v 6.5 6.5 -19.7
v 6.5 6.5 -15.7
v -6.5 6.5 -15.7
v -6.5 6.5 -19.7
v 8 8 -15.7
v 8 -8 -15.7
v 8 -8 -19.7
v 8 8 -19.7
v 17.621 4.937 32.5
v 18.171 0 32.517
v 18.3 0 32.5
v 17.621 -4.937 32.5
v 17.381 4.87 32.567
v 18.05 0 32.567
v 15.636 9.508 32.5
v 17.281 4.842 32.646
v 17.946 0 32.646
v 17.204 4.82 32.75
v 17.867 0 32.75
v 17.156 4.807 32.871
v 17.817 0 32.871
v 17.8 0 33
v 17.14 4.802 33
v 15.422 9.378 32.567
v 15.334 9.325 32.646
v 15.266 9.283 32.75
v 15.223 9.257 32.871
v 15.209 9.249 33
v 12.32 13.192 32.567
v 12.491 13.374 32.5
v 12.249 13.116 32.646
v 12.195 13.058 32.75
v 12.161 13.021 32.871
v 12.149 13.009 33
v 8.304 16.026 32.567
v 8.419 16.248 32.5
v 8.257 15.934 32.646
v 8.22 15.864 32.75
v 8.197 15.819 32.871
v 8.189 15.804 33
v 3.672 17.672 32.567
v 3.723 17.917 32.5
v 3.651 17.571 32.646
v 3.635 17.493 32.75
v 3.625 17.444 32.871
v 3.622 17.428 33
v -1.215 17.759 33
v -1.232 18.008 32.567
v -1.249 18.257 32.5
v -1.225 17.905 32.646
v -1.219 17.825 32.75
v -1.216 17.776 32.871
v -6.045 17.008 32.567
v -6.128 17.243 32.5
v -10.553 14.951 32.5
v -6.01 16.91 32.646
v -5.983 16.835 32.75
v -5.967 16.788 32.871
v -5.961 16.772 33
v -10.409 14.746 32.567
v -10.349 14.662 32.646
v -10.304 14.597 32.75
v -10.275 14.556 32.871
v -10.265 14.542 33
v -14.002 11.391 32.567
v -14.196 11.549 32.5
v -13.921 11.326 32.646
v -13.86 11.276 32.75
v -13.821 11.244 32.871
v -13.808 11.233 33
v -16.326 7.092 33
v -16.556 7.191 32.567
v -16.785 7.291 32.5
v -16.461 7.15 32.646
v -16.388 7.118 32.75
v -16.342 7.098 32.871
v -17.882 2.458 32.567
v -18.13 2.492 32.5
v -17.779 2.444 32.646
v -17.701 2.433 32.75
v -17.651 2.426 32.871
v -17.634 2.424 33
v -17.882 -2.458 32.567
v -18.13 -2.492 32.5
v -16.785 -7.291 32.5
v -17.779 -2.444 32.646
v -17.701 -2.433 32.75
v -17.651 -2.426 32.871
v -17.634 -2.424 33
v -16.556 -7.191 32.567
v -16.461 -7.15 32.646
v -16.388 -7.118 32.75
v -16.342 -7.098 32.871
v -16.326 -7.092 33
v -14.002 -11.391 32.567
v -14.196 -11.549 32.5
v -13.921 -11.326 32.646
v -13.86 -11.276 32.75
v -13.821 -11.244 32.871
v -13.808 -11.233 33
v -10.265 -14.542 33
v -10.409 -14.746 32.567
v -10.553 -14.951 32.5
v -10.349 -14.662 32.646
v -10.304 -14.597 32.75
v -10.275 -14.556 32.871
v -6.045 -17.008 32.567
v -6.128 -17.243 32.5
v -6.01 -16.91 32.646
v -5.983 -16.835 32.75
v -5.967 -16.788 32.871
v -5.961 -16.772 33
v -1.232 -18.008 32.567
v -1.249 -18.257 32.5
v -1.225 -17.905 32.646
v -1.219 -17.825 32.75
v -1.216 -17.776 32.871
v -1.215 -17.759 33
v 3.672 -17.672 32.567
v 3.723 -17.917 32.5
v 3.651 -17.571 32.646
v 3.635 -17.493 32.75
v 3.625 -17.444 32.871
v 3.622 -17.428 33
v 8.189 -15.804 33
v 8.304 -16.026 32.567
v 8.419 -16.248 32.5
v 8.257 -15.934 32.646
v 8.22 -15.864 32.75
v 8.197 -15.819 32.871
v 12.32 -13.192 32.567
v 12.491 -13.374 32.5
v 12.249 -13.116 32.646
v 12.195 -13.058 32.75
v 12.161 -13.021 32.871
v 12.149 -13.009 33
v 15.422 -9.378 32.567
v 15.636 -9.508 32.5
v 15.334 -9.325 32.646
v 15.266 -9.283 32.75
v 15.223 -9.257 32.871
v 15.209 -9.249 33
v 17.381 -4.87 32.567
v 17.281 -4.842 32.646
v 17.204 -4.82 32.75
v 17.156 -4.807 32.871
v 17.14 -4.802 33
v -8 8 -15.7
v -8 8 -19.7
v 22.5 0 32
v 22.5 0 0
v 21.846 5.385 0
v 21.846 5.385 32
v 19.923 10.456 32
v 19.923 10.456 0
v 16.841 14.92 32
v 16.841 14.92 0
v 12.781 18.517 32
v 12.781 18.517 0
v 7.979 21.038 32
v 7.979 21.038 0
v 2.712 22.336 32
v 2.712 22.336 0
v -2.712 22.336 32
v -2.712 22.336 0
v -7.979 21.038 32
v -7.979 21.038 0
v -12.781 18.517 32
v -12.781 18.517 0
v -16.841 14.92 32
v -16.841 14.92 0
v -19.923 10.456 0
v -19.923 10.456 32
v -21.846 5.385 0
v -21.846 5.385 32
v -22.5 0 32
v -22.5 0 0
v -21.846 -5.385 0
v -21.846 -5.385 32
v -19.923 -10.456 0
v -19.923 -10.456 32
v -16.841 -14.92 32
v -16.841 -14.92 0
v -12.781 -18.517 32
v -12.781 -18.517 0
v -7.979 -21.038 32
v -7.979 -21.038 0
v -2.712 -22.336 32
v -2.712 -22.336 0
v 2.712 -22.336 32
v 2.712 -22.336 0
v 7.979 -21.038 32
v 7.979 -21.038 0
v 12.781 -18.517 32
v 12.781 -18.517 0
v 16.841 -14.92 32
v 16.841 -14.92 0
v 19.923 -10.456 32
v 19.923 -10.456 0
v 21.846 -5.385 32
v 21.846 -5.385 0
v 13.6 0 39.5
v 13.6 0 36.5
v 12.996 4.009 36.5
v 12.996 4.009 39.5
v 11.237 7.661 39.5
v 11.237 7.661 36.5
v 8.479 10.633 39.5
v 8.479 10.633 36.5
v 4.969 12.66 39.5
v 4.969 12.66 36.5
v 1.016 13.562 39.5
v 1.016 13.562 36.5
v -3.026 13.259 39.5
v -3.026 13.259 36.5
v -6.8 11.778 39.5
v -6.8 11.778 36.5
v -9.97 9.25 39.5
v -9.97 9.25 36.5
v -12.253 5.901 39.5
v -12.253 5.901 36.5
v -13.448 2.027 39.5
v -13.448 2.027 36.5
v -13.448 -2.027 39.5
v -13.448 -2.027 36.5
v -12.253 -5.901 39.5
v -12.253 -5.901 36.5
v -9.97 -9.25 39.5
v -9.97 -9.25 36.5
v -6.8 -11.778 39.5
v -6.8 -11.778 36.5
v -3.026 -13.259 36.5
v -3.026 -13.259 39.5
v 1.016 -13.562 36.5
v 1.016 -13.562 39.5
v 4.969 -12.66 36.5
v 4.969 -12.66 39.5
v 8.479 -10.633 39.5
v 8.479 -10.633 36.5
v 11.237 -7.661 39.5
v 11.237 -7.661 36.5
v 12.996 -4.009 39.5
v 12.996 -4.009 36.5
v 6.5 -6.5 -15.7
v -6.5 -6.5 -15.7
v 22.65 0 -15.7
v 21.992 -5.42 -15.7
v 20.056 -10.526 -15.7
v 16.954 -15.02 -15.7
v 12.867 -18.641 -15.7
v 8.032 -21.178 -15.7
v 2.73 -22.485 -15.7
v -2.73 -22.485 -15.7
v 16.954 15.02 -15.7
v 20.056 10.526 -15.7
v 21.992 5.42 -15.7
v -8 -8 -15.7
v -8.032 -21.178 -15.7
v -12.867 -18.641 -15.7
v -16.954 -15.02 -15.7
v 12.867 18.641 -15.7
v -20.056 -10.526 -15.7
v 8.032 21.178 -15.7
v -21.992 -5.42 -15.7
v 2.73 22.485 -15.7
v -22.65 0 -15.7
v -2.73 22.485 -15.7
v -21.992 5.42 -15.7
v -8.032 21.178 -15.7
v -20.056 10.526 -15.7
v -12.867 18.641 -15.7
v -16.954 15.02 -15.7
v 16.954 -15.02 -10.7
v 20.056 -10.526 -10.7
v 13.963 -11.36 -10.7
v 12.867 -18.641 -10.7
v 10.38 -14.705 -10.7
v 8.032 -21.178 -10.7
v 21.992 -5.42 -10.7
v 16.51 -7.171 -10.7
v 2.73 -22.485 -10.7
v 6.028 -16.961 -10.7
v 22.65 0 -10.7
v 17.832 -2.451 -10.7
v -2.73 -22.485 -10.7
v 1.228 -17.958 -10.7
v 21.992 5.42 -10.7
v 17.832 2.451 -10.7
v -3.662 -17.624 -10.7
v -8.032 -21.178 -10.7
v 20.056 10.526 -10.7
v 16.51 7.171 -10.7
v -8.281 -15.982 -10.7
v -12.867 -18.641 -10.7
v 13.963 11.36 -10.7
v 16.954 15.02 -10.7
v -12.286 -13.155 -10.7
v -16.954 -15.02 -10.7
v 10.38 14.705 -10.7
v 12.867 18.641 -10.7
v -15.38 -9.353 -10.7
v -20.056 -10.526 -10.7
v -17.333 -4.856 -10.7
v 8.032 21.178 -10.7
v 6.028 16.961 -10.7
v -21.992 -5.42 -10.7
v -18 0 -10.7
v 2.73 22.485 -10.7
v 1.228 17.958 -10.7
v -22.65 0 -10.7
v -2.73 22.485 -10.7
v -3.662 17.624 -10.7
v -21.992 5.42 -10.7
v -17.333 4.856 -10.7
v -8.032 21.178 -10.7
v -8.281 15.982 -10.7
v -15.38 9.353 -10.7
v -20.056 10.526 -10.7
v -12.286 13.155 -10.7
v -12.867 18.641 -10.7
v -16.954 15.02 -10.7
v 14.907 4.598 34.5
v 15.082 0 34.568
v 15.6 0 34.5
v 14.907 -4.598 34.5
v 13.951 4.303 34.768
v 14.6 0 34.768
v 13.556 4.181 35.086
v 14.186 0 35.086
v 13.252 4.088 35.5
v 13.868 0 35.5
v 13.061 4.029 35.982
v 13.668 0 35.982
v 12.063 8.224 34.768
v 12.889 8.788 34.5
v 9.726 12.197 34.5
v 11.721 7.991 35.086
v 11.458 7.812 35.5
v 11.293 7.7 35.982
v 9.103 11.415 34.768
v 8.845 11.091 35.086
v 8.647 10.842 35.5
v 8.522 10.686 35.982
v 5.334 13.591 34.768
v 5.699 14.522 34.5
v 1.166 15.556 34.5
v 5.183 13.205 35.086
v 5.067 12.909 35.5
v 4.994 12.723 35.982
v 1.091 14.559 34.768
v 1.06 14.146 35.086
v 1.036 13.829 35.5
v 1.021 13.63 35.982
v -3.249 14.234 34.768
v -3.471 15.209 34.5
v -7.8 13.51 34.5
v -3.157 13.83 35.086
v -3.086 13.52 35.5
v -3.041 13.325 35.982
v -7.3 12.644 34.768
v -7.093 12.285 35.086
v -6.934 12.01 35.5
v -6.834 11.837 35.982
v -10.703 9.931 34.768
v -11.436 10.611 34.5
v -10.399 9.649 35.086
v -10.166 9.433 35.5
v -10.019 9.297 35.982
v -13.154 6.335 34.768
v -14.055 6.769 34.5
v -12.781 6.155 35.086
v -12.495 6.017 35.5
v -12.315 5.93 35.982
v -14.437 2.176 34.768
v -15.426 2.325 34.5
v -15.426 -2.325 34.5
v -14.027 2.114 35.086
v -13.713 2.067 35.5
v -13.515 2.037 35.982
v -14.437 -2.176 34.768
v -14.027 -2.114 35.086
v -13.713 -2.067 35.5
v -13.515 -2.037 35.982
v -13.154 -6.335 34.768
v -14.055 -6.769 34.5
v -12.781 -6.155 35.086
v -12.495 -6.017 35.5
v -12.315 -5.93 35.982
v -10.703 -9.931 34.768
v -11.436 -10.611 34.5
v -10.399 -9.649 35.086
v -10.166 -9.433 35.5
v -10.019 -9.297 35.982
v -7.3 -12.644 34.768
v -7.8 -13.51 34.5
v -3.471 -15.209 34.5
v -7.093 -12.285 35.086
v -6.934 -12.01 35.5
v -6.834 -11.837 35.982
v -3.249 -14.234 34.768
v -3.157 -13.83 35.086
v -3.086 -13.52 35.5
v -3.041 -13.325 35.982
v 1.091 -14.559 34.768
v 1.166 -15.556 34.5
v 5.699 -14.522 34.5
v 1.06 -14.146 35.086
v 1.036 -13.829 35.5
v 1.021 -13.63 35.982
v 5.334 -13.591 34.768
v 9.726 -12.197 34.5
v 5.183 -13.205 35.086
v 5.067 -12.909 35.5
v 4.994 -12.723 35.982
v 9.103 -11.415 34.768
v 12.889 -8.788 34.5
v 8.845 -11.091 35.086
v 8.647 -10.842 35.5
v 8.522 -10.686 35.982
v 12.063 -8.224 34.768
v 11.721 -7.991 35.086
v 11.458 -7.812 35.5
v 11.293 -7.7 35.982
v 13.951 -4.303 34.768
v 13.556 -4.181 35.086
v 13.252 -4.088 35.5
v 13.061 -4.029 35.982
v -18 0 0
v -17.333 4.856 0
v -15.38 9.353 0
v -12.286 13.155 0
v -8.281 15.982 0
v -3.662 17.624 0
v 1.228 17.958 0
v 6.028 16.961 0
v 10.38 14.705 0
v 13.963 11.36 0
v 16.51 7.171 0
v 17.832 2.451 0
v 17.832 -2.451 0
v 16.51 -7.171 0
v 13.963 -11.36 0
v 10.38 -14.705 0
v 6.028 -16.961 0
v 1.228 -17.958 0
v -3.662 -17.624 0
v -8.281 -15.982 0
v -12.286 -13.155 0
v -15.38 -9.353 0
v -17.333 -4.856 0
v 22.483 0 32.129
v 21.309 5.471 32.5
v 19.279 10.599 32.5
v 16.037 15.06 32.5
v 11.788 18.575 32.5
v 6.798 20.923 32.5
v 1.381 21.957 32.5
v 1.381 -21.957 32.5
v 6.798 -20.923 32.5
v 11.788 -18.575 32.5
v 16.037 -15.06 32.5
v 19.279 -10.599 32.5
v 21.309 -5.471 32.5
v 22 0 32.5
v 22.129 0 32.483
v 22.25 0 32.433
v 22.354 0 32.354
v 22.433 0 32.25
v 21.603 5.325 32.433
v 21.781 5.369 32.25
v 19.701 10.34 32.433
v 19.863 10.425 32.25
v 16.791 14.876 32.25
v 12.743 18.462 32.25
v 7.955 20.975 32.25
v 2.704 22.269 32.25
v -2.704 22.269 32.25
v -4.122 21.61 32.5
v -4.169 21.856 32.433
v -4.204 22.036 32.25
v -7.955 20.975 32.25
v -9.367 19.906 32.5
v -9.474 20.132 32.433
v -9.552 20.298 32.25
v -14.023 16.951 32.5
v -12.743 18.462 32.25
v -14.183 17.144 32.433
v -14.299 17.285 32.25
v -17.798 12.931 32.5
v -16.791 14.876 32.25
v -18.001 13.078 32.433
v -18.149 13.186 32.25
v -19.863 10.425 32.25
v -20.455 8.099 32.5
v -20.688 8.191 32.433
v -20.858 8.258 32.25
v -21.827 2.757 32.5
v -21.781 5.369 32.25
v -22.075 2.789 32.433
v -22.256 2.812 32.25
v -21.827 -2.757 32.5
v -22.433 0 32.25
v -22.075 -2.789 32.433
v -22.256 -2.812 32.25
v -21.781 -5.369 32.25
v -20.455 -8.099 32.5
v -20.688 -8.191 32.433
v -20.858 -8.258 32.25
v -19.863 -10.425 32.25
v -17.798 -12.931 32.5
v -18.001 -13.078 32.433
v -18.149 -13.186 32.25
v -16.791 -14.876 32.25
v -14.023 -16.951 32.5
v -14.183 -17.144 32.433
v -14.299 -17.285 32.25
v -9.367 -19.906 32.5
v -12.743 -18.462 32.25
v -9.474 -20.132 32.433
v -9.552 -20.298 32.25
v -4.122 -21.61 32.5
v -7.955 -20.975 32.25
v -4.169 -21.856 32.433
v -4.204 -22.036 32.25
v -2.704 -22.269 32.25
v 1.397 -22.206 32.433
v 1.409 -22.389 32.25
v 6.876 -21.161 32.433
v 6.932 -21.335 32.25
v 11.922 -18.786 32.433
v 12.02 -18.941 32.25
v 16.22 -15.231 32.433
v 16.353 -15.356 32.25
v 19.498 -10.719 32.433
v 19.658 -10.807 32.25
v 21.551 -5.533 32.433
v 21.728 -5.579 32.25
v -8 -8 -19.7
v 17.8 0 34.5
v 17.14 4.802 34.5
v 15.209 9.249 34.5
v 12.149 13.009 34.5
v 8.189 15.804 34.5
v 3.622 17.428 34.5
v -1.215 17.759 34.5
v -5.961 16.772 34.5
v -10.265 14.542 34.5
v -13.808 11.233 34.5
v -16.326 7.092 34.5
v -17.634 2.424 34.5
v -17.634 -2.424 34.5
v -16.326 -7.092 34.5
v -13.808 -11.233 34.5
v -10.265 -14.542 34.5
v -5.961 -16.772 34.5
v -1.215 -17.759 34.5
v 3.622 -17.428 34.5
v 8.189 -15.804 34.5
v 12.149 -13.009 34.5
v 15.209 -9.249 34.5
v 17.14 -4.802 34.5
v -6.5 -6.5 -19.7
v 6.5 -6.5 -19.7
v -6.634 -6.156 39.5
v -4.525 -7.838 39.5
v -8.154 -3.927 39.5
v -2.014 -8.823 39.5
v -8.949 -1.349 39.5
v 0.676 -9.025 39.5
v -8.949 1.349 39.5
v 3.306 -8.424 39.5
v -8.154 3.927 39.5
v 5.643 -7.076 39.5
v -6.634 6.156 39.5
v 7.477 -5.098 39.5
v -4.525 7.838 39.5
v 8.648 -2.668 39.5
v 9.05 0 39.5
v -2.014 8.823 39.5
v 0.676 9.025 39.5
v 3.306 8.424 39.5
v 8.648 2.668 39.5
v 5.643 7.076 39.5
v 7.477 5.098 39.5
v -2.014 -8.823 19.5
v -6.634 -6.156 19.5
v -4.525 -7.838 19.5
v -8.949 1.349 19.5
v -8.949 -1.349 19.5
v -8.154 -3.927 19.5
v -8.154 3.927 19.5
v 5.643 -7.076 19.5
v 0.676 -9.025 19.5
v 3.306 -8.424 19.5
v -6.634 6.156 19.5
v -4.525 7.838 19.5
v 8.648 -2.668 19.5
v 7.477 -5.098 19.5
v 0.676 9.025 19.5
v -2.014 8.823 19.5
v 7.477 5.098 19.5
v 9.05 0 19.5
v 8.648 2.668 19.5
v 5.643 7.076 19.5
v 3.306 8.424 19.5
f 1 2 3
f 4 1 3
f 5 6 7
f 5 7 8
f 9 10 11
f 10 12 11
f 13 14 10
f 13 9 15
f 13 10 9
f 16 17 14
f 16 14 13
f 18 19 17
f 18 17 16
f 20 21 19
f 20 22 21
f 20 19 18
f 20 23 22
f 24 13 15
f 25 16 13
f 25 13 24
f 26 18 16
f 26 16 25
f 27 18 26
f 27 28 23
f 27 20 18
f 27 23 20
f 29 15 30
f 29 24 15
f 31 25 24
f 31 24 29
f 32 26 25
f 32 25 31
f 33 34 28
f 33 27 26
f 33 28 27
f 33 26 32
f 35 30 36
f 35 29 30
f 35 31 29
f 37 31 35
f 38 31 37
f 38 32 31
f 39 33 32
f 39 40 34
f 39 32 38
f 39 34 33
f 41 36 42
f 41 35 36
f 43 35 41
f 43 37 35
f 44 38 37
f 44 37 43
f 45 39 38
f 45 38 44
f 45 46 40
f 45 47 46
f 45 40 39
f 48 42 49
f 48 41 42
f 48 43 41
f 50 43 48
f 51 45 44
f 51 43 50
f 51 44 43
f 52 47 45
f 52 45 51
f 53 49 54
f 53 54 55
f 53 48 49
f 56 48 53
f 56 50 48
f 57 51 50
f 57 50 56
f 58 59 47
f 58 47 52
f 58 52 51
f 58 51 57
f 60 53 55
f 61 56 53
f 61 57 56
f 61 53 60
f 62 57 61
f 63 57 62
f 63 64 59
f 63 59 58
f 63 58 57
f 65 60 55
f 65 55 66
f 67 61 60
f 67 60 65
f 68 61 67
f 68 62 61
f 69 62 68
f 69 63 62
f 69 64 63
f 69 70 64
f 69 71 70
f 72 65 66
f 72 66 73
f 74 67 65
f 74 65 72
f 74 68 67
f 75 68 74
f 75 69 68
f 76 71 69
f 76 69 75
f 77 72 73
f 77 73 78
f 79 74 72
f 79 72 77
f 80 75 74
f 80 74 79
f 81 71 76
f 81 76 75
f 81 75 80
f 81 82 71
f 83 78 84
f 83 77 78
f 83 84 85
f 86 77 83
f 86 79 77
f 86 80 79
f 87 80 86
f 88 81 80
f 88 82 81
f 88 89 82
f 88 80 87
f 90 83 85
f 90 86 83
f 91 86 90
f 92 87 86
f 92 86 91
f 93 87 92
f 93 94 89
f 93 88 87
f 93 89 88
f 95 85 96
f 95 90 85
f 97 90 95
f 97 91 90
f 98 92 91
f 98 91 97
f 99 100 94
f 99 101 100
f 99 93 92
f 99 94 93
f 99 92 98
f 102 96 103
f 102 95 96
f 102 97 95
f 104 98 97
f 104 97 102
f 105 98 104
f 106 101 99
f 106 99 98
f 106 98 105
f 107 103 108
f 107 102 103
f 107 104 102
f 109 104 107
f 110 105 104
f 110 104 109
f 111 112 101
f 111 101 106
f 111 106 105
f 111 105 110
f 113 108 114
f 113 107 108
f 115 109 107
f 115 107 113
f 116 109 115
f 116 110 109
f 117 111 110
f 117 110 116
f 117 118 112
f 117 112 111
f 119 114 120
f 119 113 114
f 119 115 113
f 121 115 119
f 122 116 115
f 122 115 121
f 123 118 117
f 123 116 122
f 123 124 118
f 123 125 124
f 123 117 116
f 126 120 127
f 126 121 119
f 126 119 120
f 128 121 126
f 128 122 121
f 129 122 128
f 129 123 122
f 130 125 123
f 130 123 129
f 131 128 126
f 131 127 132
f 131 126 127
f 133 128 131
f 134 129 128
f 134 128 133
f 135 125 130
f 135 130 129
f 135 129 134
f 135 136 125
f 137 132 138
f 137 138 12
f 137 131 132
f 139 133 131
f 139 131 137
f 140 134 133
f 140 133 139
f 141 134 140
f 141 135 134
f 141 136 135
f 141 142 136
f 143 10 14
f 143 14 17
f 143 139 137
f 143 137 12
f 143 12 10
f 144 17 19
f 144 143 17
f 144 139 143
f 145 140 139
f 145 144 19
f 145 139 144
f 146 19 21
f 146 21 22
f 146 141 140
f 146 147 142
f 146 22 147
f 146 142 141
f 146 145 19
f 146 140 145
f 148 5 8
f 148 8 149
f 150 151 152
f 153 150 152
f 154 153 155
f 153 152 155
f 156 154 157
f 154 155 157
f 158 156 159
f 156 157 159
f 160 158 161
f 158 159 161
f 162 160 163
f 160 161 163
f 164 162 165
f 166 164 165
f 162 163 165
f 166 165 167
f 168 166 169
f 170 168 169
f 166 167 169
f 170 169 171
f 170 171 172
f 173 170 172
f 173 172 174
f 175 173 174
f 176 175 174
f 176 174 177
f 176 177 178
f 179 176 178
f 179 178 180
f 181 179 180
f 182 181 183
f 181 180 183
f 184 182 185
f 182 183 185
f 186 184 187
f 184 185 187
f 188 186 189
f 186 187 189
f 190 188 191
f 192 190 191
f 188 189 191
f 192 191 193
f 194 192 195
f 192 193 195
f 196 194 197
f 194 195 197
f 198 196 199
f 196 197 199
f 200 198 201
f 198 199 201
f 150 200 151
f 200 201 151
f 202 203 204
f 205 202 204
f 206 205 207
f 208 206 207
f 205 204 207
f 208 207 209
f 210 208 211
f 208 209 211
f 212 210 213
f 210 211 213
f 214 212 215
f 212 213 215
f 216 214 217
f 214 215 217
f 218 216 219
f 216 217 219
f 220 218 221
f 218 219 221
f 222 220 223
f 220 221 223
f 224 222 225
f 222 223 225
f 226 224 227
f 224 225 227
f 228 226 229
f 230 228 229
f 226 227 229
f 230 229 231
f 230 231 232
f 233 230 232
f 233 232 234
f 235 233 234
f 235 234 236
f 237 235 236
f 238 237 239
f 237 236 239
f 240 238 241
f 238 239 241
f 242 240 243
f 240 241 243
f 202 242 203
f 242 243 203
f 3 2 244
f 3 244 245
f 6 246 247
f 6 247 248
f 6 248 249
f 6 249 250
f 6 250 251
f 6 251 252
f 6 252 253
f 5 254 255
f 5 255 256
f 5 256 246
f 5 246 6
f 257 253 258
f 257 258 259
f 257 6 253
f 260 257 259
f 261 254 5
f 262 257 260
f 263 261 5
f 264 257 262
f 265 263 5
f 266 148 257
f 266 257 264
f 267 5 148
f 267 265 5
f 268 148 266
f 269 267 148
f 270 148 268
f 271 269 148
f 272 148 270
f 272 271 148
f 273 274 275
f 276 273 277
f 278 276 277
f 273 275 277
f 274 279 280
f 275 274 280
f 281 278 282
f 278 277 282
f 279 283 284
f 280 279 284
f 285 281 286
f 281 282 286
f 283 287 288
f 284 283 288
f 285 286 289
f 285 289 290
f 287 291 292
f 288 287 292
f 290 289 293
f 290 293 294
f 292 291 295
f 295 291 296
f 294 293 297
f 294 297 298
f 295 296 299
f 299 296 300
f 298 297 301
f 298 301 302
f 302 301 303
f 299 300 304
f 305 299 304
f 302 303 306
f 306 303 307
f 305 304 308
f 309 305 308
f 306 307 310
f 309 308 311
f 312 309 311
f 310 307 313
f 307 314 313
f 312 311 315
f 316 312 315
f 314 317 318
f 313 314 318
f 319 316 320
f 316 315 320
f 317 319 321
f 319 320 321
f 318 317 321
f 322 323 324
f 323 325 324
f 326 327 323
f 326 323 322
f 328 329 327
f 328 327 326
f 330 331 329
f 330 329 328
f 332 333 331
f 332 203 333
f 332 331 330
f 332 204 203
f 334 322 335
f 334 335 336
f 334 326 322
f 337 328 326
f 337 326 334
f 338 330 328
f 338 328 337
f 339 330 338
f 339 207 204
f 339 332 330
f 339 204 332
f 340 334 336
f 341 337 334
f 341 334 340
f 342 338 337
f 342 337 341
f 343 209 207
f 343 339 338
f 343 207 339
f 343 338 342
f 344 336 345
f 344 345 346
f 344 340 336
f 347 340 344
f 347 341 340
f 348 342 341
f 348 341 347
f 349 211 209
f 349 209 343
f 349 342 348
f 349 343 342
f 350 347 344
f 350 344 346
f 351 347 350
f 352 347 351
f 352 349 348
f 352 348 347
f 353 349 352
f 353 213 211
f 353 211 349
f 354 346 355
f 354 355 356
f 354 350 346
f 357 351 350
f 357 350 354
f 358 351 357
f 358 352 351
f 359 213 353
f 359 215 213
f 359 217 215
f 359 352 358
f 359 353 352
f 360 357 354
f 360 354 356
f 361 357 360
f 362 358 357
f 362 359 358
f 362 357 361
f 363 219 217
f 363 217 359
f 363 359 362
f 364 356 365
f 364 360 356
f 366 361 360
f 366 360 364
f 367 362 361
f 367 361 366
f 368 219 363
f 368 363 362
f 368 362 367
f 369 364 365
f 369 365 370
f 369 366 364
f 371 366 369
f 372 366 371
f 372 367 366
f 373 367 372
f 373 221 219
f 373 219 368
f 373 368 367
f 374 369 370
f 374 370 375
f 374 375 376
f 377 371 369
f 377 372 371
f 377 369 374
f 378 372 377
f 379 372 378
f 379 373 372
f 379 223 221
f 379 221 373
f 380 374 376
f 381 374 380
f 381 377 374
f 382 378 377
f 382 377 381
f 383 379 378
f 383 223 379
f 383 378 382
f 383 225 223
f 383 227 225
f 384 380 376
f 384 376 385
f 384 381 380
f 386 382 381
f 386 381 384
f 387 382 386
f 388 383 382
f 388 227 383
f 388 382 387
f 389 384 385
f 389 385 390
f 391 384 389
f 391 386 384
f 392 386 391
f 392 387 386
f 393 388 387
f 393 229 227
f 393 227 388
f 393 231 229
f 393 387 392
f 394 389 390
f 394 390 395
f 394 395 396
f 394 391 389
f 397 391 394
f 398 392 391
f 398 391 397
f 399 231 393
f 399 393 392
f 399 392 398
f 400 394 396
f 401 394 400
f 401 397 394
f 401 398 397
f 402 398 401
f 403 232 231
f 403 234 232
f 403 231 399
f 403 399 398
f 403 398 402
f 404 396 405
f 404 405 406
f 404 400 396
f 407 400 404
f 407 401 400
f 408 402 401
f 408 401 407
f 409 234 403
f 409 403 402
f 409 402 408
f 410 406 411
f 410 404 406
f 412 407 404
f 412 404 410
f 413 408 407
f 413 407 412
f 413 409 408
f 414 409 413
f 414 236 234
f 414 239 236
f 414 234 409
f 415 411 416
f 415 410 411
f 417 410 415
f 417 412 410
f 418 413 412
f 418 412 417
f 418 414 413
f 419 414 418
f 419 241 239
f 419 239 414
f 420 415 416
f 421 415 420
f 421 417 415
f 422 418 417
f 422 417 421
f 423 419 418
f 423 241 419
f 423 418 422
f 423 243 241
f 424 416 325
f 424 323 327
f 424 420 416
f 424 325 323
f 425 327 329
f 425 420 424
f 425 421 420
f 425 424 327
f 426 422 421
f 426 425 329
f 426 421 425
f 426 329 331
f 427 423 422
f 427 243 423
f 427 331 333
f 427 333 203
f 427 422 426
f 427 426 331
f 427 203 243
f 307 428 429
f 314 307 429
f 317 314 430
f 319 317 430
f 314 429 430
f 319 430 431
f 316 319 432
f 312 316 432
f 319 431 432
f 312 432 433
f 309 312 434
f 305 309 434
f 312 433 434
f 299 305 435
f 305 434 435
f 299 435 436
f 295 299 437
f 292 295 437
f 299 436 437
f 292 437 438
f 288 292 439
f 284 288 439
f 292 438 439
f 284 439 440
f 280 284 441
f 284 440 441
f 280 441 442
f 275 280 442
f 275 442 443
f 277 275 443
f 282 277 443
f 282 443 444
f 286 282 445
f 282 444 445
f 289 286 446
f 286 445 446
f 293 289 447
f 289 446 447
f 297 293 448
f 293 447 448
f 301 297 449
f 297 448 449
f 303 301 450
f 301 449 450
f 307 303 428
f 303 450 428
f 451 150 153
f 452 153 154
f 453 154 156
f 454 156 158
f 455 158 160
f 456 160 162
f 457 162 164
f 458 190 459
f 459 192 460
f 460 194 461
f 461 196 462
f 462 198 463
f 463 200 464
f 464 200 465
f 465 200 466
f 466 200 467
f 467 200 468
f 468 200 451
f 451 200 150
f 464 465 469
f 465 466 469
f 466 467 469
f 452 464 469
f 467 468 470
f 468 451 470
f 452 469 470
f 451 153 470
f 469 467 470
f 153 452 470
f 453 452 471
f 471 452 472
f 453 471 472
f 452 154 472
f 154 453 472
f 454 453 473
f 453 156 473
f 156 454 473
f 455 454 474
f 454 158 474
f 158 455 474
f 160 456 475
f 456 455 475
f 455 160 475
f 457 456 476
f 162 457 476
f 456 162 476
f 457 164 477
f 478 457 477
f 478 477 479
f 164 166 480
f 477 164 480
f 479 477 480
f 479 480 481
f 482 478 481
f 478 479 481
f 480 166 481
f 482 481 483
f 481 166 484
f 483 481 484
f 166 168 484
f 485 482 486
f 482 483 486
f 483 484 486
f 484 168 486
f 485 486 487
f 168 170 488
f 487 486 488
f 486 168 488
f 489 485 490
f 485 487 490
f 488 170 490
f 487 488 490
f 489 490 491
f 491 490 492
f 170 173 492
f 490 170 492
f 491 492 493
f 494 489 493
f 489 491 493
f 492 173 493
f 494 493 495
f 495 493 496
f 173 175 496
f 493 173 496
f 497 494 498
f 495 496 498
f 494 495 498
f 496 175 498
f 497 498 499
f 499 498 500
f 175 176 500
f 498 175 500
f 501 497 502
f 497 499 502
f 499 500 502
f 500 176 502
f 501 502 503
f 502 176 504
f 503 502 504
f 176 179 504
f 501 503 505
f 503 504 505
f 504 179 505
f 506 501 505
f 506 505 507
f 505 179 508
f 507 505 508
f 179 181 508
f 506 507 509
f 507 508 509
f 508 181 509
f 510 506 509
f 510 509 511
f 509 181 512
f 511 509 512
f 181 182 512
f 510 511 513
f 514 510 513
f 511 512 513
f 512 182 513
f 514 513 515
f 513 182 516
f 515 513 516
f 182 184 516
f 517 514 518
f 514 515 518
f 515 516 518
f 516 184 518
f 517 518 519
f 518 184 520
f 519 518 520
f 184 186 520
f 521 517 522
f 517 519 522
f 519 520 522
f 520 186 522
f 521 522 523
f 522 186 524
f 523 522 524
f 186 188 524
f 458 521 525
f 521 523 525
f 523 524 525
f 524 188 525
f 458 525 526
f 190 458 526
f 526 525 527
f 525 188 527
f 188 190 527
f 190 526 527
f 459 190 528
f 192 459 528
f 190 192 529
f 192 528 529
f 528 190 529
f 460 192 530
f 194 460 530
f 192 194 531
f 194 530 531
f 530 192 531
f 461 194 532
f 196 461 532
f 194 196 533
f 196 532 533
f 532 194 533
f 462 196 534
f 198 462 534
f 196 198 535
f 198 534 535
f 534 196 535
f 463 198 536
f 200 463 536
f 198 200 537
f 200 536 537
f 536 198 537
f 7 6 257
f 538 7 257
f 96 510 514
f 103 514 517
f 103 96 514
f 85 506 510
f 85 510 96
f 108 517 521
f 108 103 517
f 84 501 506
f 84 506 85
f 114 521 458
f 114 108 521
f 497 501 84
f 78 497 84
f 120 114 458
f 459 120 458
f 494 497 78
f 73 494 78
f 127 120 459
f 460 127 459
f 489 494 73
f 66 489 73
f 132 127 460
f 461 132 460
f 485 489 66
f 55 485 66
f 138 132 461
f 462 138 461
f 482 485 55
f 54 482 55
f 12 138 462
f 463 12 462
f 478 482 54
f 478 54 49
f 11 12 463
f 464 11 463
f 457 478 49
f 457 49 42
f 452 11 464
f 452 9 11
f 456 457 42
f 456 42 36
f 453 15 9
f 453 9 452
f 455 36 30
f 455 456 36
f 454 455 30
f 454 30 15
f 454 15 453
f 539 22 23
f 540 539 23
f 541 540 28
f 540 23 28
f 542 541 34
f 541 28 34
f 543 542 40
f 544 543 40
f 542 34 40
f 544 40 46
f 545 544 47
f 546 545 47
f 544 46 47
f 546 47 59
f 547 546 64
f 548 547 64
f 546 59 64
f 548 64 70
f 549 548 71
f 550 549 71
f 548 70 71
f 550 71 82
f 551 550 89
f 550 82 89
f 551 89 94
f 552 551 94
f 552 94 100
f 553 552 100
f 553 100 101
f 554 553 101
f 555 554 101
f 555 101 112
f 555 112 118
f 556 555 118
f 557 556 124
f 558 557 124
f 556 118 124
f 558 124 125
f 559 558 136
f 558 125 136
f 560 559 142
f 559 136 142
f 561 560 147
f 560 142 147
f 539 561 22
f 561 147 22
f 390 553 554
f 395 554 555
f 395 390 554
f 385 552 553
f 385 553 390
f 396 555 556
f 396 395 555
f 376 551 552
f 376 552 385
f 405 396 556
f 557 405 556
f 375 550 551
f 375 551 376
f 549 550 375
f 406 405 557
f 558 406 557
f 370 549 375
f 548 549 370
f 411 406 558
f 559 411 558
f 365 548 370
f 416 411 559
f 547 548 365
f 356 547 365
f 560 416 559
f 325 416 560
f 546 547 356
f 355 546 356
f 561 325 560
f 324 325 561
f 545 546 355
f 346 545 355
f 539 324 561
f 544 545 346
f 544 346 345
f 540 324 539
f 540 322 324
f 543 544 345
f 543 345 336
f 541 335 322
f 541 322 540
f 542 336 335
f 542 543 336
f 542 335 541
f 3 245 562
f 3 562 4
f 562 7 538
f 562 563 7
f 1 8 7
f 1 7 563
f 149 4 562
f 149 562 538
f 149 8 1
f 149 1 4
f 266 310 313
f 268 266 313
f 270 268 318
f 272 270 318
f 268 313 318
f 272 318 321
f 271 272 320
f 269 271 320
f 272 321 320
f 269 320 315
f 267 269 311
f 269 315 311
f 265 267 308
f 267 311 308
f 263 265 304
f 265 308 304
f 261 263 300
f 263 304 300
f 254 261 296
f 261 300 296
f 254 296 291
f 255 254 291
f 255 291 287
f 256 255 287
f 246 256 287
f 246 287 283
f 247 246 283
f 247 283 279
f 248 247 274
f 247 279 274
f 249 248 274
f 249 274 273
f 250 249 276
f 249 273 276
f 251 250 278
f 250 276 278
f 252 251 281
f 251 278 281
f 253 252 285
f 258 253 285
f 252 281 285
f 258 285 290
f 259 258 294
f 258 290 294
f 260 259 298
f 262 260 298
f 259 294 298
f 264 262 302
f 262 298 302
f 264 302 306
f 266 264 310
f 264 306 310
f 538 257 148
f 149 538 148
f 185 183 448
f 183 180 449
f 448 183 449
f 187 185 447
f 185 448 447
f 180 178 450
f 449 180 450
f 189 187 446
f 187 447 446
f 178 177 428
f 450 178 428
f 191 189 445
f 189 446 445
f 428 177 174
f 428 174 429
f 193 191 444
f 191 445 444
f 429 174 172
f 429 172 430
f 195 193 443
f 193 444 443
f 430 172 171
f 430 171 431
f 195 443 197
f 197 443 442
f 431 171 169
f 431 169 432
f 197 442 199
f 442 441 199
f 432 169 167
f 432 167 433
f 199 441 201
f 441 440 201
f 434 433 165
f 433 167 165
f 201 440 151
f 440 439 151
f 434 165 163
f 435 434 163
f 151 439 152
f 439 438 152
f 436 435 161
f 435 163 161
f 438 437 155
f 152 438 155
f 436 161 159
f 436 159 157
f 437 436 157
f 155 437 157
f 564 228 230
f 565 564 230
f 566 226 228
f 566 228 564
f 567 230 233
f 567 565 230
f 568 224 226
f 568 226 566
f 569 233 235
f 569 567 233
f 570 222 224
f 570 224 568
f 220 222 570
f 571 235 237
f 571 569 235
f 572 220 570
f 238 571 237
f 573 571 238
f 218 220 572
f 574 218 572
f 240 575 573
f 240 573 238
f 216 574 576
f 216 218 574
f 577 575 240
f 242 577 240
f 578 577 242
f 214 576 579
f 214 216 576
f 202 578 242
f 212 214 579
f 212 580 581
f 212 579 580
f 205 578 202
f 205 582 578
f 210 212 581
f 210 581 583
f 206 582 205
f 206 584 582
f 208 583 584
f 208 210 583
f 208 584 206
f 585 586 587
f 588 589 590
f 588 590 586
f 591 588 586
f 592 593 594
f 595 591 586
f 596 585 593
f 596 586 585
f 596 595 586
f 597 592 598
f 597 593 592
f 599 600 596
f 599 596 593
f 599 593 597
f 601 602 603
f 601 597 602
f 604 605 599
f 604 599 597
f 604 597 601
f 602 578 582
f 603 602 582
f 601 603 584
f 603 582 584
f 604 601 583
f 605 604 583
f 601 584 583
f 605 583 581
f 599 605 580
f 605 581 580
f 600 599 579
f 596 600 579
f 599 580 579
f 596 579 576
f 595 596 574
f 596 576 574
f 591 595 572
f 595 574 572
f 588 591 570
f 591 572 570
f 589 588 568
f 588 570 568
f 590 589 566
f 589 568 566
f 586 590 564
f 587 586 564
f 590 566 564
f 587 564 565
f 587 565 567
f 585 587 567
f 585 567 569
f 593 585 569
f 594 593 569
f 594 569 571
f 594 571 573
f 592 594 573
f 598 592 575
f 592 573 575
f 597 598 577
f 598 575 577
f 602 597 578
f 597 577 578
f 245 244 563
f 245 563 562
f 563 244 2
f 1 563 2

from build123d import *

# Parameters (mm, degrees)
IZIM1_R                     = 22.5
Y_KSEKLIK_EKSTR_ZYON1_DEPTH = 32.5
IZIM2_R                     = 17.8
Y_KSEKLIK_EKSTR_ZYON2_DEPTH = 2
RADYUS1_R                   = 0.5
IZIM3_R                     = 13.6
Y_KSEKLIK_EKSTR_ZYON3_DEPTH = 5
RADYUS2_R                   = 2
IZIM4_R                     = 9.05
KES_EKSTR_ZYON1_DEPTH       = 20
RADYUS3_R                   = 0.5
IZIM5_R                     = 18
Y_KSEKLIK_EKSTR_ZYON4_DEPTH = 10.7
IZIM6_R                     = 22.65
Y_KSEKLIK_EKSTR_ZYON5_DEPTH = 5
IZIM7_W                     = 16
IZIM7_H                     = 16
IZIM7_W_2                   = 13
IZIM7_H_2                   = 13
Y_KSEKLIK_EKSTR_ZYON6_DEPTH = 4


with BuildPart() as part:
    # Çizim1 → Yükseklik-Ekstrüzyon1 (new body)
    with BuildSketch(Plane.XY):
        Circle(IZIM1_R)
    extrude(amount=Y_KSEKLIK_EKSTR_ZYON1_DEPTH)

    # Çizim2 → Yükseklik-Ekstrüzyon2 (add)
    with BuildSketch(Plane.XY.offset(32.5)):
        Circle(IZIM2_R)
    extrude(amount=Y_KSEKLIK_EKSTR_ZYON2_DEPTH)

    # Radyus1
    radyus1_edges = [part.edges().sort_by_distance(p)[0] for p in [
        (-17.8, 0, 32.5),
    ]]
    fillet(radyus1_edges, radius=RADYUS1_R)

    # Çizim3 → Yükseklik-Ekstrüzyon3 (add)
    with BuildSketch(Plane.XY.offset(34.5)):
        Circle(IZIM3_R)
    extrude(amount=Y_KSEKLIK_EKSTR_ZYON3_DEPTH)

    # Radyus2
    radyus2_edges = [part.edges().sort_by_distance(p)[0] for p in [
        (-13.6, 0, 34.5),
    ]]
    fillet(radyus2_edges, radius=RADYUS2_R)

    # Çizim4 → Kes-Ekstrüzyon1 (cut)
    with BuildSketch(Plane.XY.offset(39.5)):
        Circle(IZIM4_R)
    extrude(amount=-KES_EKSTR_ZYON1_DEPTH, mode=Mode.SUBTRACT)

    # Radyus3
    radyus3_edges = [part.edges().sort_by_distance(p)[0] for p in [
        (-22.5, 0, 32.5),
    ]]
    fillet(radyus3_edges, radius=RADYUS3_R)

    # Çizim5 → Yükseklik-Ekstrüzyon4 (add)
    with BuildSketch(Plane(origin=(0, 0, 0), x_dir=(-1, 0, 0), z_dir=(0, 0, -1))):
        Circle(IZIM5_R)
    extrude(amount=Y_KSEKLIK_EKSTR_ZYON4_DEPTH)

    # Çizim6 → Yükseklik-Ekstrüzyon5 (add)
    with BuildSketch(Plane(origin=(0, 0, -10.7), x_dir=(-1, 0, 0), z_dir=(0, 0, -1))):
        Circle(IZIM6_R)
    extrude(amount=Y_KSEKLIK_EKSTR_ZYON5_DEPTH)

    # Çizim7 → Yükseklik-Ekstrüzyon6 (add)
    with BuildSketch(Plane(origin=(0, 0, -15.7), x_dir=(-1, 0, 0), z_dir=(0, 0, -1))):
        Rectangle(IZIM7_W, IZIM7_H)
        Rectangle(IZIM7_W_2, IZIM7_H_2, mode=Mode.SUBTRACT)
    extrude(amount=Y_KSEKLIK_EKSTR_ZYON6_DEPTH)


solid = part.part
